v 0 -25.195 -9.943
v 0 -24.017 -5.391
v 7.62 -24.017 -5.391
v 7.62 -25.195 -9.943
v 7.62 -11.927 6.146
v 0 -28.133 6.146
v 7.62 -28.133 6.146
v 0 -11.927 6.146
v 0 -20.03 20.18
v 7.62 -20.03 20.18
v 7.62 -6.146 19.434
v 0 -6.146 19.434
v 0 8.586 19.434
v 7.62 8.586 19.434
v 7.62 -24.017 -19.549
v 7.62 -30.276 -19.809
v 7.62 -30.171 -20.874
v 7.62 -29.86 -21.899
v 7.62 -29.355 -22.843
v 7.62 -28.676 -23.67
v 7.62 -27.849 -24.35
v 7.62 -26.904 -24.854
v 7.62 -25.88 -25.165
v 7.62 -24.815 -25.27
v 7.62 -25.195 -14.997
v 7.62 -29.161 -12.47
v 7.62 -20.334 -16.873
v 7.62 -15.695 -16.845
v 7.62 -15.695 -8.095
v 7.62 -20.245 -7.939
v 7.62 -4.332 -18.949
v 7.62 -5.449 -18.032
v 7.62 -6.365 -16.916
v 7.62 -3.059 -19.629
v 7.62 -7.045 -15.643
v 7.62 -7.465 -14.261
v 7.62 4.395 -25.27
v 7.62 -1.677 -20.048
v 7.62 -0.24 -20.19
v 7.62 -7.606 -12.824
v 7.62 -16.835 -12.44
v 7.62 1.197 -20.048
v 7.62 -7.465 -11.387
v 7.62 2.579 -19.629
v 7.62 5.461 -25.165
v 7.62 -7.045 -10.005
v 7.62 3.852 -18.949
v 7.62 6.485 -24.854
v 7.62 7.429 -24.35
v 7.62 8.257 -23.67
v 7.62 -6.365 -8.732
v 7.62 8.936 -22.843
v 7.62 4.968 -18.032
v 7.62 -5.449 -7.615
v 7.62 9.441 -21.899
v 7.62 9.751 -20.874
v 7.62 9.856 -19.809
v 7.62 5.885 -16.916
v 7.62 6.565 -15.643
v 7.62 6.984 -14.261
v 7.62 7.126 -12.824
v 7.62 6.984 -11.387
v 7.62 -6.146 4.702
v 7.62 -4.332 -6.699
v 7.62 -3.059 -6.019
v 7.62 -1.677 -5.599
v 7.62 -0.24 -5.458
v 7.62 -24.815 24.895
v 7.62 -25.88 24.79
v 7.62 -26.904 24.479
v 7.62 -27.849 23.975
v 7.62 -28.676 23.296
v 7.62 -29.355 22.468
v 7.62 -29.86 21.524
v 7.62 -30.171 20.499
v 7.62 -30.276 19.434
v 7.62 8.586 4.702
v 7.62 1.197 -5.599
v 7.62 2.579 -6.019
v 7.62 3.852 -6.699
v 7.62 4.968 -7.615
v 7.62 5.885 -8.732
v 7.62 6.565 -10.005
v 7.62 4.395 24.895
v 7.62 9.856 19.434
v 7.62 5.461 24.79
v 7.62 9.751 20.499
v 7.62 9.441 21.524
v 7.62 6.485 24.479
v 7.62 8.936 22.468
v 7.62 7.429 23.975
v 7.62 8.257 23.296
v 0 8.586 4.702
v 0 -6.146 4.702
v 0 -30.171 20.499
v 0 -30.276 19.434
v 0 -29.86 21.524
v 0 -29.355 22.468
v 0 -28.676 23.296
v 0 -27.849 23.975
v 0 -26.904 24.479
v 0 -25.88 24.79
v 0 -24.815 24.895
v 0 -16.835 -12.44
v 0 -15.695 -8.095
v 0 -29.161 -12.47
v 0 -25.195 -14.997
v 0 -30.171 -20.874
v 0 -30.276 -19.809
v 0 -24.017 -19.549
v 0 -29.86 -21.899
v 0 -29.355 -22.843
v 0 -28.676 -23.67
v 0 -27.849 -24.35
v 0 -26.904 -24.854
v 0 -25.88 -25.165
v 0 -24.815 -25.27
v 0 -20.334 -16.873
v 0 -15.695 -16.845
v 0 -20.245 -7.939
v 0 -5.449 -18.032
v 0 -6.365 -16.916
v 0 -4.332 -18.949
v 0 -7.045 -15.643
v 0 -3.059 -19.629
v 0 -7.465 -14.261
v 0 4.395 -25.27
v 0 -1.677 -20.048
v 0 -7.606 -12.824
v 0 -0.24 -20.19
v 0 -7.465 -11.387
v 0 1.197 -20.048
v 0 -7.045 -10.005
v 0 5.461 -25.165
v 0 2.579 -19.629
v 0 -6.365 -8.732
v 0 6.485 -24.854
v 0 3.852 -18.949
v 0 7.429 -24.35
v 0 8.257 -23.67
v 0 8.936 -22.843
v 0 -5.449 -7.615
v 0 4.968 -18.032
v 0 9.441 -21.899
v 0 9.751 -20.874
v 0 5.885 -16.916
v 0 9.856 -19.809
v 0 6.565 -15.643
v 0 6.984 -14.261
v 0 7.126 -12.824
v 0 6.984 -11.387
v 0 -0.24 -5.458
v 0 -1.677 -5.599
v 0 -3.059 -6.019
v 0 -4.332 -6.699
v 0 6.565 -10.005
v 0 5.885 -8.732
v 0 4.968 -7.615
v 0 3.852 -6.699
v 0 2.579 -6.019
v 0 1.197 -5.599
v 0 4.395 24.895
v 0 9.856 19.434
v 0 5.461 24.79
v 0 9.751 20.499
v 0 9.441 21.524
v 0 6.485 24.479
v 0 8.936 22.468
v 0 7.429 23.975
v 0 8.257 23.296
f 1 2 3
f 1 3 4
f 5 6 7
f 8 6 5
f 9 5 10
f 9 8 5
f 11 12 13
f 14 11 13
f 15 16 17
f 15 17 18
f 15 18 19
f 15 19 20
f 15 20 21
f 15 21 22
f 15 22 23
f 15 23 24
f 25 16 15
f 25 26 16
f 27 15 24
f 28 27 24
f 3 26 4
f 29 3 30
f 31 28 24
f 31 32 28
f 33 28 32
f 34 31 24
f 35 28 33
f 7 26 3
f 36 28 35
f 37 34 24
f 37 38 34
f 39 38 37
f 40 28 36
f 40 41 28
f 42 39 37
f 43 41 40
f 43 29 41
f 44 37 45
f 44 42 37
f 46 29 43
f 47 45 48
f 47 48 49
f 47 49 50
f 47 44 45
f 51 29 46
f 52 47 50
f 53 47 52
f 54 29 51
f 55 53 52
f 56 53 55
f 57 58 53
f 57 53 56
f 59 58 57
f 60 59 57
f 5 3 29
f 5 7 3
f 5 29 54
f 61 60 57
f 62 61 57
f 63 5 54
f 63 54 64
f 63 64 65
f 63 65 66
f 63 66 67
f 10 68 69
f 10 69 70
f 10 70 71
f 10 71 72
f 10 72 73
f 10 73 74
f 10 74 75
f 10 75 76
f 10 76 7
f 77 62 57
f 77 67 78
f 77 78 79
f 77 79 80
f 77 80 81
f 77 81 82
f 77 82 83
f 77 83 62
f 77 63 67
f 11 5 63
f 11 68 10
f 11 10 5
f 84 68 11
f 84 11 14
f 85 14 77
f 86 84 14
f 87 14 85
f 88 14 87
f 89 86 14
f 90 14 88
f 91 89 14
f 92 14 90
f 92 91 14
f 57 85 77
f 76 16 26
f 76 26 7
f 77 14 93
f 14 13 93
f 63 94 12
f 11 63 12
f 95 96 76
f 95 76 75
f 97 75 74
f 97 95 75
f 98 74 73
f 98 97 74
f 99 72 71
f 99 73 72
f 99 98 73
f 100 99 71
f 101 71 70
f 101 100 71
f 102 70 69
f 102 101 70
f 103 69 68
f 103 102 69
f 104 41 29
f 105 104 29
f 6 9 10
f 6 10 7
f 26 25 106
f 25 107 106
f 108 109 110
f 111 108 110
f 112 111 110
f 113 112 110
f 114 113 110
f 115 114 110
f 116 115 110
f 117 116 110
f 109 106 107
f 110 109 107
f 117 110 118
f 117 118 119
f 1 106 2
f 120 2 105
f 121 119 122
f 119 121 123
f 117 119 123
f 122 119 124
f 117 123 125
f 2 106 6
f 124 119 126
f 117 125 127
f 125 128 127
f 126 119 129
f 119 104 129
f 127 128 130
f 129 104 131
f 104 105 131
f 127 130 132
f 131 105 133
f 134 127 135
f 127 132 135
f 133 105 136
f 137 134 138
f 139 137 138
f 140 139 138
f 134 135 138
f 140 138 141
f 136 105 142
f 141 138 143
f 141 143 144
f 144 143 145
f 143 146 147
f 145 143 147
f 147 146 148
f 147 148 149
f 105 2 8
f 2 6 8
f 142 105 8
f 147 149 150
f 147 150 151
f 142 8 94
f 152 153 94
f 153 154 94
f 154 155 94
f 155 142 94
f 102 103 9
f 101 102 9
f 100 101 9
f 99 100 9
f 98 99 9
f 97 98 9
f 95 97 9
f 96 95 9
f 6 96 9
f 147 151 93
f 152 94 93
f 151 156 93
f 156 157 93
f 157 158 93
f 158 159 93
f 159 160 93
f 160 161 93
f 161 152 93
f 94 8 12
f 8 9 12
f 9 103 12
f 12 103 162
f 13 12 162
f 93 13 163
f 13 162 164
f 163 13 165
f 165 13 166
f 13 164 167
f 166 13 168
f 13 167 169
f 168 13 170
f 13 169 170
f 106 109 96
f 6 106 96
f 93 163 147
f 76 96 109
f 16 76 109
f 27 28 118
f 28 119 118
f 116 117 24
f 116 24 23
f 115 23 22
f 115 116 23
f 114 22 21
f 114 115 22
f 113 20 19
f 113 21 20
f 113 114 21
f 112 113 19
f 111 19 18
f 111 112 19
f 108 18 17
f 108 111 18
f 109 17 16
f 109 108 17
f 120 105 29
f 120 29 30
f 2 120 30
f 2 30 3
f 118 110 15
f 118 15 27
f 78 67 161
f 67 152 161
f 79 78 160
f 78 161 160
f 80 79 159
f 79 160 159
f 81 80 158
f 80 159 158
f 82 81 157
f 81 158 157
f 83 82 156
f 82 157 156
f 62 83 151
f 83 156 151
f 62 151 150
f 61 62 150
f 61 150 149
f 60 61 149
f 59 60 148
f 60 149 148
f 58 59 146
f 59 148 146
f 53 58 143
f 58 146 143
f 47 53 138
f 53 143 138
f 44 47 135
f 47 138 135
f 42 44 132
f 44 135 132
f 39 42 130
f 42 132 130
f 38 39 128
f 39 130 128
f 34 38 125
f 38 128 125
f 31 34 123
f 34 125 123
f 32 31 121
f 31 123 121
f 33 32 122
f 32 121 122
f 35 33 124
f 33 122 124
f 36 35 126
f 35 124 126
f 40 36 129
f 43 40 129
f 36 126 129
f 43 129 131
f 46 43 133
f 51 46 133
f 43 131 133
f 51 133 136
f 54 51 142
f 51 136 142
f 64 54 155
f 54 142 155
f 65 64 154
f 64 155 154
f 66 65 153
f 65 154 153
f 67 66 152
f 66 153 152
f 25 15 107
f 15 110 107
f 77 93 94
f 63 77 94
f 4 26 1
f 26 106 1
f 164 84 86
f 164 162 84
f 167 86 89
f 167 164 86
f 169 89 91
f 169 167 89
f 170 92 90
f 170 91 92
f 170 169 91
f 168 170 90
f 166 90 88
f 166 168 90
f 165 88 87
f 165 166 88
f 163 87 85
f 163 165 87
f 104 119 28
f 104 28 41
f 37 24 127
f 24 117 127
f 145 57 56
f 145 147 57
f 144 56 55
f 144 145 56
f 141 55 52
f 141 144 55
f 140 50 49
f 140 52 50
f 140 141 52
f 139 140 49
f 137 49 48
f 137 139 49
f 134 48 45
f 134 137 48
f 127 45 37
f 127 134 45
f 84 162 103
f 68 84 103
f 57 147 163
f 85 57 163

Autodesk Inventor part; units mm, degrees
ref_plane "YZ Plane" through (0, 0, 0) normal (1, 0, 0) x (0, 1, 0)
ref_plane "XZ Plane" through (0, 0, 0) normal (0, 1, 0) x (-1, 0, 0)
ref_plane "XY Plane" through (0, 0, 0) normal (0, 0, 1) x (1, 0, 0)
sketch "Sketch1" plane through (0, 0, 0) normal (1, 0, 0) x (0, 1, 0)
  line L0 (4.3954, 24.8951) -> (-24.8146, 24.8951)
  line L1 (-30.2756, 19.4341) -> (-30.2756, -19.8089)
  line L2 (-24.8146, -25.2699) -> (4.3954, -25.2699)
  line L3 (9.8564, -19.8089) -> (9.8564, 19.4341)
  arc A0 (4.3954, -25.2699) -> (9.8564, -19.8089) centre (4.3954, -19.8089) ccw
  arc A1 (9.8564, 19.4341) -> (4.3954, 24.8951) centre (4.3954, 19.4341) ccw
  arc A2 (-30.2756, -19.8089) -> (-24.8146, -25.2699) centre (-24.8146, -19.8089) ccw
  arc A3 (-24.8146, 24.8951) -> (-30.2756, 19.4341) centre (-24.8146, 19.4341) ccw
  point P0 (0, 0)
  point P1 (-30.2756, -25.2699)
  point P2 (-30.2756, 24.8951)
  point P3 (9.8564, -25.2699)
  dimension "d0" = 40.132
  dimension "d1" = 50.165
  dimension "d2" = 5.461
  dimension "d3" = 5.461
extrude "Extrusion1" add sketch "Sketch1" along normal blind 7.62
sketch "Sketch2" plane through (0, 0, 0) normal (-1, 0, 0) x (0, 0, 1)
  line L0 (-25.2699, -24.8146) -> (-25.2699, 4.3954) projected
  line L1 (-25.2699, 4.3954) -> (-20.1899, 4.3954)
  line L2 (-20.1899, 4.3954) -> (-20.1899, 9.8564)
  line L3 (19.4341, 9.8564) -> (-19.8089, 9.8564) projected
  line L4 (-20.1899, 7.1259) -> (-5.4579, 7.1259)
  line L5 (-5.4579, 7.1259) -> (-5.4579, -7.6061)
  line L6 (-5.4579, -7.6061) -> (-20.1899, -7.6061)
  line L7 (-20.1899, -7.6061) -> (-20.1899, 7.1259)
  circle A0 centre (-12.8239, -0.2401) radius 7.366
  point P0 (0, 0)
  dimension "d6" = 5.08
  dimension "d7" = 14.732
  dimension "d8" = 14.732
  dimension "d9" = 14.732
extrude "Extrusion2" cut sketch "Sketch2" against normal up to next contours A0
sketch "Sketch3" plane through (0, 0, 0) normal (-1, 0, 0) x (0, 0, 1)
  point P0 (0, 0)
sketch "Sketch4" plane through (0, 0, 0) normal (-1, 0, 0) x (0, 0, 1)
  arc A0 (24.8951, 4.3954) -> (19.4341, 9.8564) centre (19.8306, 4.7919) ccw
  line L0 (19.4341, 9.8564) -> (19.4341, 8.5864)
  line L1 (19.4341, 8.5864) -> (4.7021, 8.5864)
  line L2 (4.7021, 8.5864) -> (4.7021, -6.1456)
  line L3 (4.7021, -6.1456) -> (19.4341, -6.1456)
  line L4 (19.4341, -6.1456) -> (19.4341, 8.5864)
  point P0 (0, 0)
  dimension "d13" = 1.27
  dimension "d14" = 14.732
  dimension "d15" = 14.732
extrude "Extrusion3" cut sketch "Sketch4" against normal up to next
sketch "Sketch5" plane through (0, 0, 0) normal (-1, 0, 0) x (0, 0, 1)
  line L0 (20.1796, -20.03) -> (6.1455, -28.1326)
  line L1 (6.1455, -28.1326) -> (6.1455, -11.9274)
  line L2 (6.1455, -11.9274) -> (20.1796, -20.03)
  line L3 (4.3902, -29.2503) -> (21.3615, -29.2503)
  point P0 (0, 0)
  point P1 (10.8235, -20.03)
  dimension "d18" = 16.2052
extrude "Extrusion4" cut sketch "Sketch5" against normal up to next
sketch "Sketch6" plane through (0, 0, 0) normal (-1, 0, 0) x (0, 0, 1)
  line L0 (19.4341, -30.2756) -> (-19.8089, -30.2756) projected
  line L1 (-24.8889, -30.2756) -> (-19.8089, -30.2756)
  line L2 (-19.8089, -30.2756) -> (-19.8089, -29.0056)
  line L3 (-19.8089, -29.0056) -> (-5.0769, -29.0056) construction
  line L4 (-5.0769, -29.0056) -> (-5.0769, -14.2736)
  line L5 (-5.0769, -14.2736) -> (-19.8089, -14.2736) construction
  line L6 (-19.8089, -14.2736) -> (-19.8089, -29.0056) construction
  circle A0 centre (-12.47, -21.7171) radius 7.4436 construction
  line L7 (-8.0948, -15.6951) -> (-5.3908, -24.0173) construction
  line L8 (-5.3908, -24.0173) -> (-12.47, -29.1607) construction
  line L9 (-12.47, -29.1607) -> (-19.5493, -24.0173) construction
  line L10 (-19.5493, -24.0173) -> (-16.8452, -15.6951) construction
  line L11 (-16.8452, -15.6951) -> (-8.0948, -15.6951) construction
  line L12 (-12.47, -21.7171) -> (-5.3908, -24.0173) construction
  line L13 (-12.47, -21.7171) -> (-8.0948, -15.6951) construction
  line L14 (-12.47, -21.7171) -> (-16.8452, -15.6951) construction
  line L15 (-12.47, -21.7171) -> (-19.5493, -24.0173) construction
  line L16 (-16.8452, -15.6951) -> (-11.847, -15.6951) construction
  line L17 (-12.47, -29.1607) -> (-7.7202, -29.1607) construction
  line L18 (-12.47, -21.7171) -> (-12.47, -29.1607) construction
  line L19 (-12.47, -21.7171) -> (-6.7428, -19.8562) construction
  line L20 (-8.0948, -15.6951) -> (-7.9391, -20.2449)
  line L21 (-7.9391, -20.2449) -> (-5.3908, -24.0173)
  line L22 (-12.47, -21.7171) -> (-8.9304, -26.589) construction
  line L23 (-5.3908, -24.0173) -> (-9.9432, -25.195)
  line L24 (-12.47, -29.1607) -> (-9.9432, -25.195)
  line L25 (-12.47, -21.7171) -> (-16.0096, -26.589) construction
  line L26 (-12.47, -21.7171) -> (-18.666, -19.7714) construction
  line L27 (-12.47, -21.7171) -> (-12.4334, -15.6951) construction
  line L28 (-19.5493, -24.0173) -> (-16.8734, -20.3343)
  line L29 (-16.8452, -15.6951) -> (-16.8734, -20.3343)
  line L30 (-16.8452, -15.6951) -> (-12.4404, -16.8346)
  line L31 (-12.4404, -16.8346) -> (-8.0948, -15.6951)
  line L32 (-19.5493, -24.0173) -> (-14.9968, -25.195)
  line L33 (-14.9968, -25.195) -> (-12.47, -29.1607)
  point P0 (0, 0)
  point P1 (-12.2672, -15.6951)
  dimension "d21" = 5.08
  dimension "d22" = 1.27
  dimension "d23" = 14.732
  dimension "d24" = 14.732
  dimension "d33" = 4.5524
  dimension "d34" = 4.5524
sketch "Sketch7" plane through (0, 0, 0) normal (-1, 0, 0) x (0, 0, 1)
  point P0 (0, 0)
sketch "Sketch8" plane through (0, 0, 0) normal (-1, 0, 0) x (0, 0, 1)
  point P0 (0, 0)
sketch "Sketch9" plane through (0, 0, 0) normal (-1, 0, 0) x (0, 0, 1)
  point P0 (0, 0)
extrude "Extrusion5" cut sketch "Sketch6" against normal up to next
properties part number "Passenger base"
